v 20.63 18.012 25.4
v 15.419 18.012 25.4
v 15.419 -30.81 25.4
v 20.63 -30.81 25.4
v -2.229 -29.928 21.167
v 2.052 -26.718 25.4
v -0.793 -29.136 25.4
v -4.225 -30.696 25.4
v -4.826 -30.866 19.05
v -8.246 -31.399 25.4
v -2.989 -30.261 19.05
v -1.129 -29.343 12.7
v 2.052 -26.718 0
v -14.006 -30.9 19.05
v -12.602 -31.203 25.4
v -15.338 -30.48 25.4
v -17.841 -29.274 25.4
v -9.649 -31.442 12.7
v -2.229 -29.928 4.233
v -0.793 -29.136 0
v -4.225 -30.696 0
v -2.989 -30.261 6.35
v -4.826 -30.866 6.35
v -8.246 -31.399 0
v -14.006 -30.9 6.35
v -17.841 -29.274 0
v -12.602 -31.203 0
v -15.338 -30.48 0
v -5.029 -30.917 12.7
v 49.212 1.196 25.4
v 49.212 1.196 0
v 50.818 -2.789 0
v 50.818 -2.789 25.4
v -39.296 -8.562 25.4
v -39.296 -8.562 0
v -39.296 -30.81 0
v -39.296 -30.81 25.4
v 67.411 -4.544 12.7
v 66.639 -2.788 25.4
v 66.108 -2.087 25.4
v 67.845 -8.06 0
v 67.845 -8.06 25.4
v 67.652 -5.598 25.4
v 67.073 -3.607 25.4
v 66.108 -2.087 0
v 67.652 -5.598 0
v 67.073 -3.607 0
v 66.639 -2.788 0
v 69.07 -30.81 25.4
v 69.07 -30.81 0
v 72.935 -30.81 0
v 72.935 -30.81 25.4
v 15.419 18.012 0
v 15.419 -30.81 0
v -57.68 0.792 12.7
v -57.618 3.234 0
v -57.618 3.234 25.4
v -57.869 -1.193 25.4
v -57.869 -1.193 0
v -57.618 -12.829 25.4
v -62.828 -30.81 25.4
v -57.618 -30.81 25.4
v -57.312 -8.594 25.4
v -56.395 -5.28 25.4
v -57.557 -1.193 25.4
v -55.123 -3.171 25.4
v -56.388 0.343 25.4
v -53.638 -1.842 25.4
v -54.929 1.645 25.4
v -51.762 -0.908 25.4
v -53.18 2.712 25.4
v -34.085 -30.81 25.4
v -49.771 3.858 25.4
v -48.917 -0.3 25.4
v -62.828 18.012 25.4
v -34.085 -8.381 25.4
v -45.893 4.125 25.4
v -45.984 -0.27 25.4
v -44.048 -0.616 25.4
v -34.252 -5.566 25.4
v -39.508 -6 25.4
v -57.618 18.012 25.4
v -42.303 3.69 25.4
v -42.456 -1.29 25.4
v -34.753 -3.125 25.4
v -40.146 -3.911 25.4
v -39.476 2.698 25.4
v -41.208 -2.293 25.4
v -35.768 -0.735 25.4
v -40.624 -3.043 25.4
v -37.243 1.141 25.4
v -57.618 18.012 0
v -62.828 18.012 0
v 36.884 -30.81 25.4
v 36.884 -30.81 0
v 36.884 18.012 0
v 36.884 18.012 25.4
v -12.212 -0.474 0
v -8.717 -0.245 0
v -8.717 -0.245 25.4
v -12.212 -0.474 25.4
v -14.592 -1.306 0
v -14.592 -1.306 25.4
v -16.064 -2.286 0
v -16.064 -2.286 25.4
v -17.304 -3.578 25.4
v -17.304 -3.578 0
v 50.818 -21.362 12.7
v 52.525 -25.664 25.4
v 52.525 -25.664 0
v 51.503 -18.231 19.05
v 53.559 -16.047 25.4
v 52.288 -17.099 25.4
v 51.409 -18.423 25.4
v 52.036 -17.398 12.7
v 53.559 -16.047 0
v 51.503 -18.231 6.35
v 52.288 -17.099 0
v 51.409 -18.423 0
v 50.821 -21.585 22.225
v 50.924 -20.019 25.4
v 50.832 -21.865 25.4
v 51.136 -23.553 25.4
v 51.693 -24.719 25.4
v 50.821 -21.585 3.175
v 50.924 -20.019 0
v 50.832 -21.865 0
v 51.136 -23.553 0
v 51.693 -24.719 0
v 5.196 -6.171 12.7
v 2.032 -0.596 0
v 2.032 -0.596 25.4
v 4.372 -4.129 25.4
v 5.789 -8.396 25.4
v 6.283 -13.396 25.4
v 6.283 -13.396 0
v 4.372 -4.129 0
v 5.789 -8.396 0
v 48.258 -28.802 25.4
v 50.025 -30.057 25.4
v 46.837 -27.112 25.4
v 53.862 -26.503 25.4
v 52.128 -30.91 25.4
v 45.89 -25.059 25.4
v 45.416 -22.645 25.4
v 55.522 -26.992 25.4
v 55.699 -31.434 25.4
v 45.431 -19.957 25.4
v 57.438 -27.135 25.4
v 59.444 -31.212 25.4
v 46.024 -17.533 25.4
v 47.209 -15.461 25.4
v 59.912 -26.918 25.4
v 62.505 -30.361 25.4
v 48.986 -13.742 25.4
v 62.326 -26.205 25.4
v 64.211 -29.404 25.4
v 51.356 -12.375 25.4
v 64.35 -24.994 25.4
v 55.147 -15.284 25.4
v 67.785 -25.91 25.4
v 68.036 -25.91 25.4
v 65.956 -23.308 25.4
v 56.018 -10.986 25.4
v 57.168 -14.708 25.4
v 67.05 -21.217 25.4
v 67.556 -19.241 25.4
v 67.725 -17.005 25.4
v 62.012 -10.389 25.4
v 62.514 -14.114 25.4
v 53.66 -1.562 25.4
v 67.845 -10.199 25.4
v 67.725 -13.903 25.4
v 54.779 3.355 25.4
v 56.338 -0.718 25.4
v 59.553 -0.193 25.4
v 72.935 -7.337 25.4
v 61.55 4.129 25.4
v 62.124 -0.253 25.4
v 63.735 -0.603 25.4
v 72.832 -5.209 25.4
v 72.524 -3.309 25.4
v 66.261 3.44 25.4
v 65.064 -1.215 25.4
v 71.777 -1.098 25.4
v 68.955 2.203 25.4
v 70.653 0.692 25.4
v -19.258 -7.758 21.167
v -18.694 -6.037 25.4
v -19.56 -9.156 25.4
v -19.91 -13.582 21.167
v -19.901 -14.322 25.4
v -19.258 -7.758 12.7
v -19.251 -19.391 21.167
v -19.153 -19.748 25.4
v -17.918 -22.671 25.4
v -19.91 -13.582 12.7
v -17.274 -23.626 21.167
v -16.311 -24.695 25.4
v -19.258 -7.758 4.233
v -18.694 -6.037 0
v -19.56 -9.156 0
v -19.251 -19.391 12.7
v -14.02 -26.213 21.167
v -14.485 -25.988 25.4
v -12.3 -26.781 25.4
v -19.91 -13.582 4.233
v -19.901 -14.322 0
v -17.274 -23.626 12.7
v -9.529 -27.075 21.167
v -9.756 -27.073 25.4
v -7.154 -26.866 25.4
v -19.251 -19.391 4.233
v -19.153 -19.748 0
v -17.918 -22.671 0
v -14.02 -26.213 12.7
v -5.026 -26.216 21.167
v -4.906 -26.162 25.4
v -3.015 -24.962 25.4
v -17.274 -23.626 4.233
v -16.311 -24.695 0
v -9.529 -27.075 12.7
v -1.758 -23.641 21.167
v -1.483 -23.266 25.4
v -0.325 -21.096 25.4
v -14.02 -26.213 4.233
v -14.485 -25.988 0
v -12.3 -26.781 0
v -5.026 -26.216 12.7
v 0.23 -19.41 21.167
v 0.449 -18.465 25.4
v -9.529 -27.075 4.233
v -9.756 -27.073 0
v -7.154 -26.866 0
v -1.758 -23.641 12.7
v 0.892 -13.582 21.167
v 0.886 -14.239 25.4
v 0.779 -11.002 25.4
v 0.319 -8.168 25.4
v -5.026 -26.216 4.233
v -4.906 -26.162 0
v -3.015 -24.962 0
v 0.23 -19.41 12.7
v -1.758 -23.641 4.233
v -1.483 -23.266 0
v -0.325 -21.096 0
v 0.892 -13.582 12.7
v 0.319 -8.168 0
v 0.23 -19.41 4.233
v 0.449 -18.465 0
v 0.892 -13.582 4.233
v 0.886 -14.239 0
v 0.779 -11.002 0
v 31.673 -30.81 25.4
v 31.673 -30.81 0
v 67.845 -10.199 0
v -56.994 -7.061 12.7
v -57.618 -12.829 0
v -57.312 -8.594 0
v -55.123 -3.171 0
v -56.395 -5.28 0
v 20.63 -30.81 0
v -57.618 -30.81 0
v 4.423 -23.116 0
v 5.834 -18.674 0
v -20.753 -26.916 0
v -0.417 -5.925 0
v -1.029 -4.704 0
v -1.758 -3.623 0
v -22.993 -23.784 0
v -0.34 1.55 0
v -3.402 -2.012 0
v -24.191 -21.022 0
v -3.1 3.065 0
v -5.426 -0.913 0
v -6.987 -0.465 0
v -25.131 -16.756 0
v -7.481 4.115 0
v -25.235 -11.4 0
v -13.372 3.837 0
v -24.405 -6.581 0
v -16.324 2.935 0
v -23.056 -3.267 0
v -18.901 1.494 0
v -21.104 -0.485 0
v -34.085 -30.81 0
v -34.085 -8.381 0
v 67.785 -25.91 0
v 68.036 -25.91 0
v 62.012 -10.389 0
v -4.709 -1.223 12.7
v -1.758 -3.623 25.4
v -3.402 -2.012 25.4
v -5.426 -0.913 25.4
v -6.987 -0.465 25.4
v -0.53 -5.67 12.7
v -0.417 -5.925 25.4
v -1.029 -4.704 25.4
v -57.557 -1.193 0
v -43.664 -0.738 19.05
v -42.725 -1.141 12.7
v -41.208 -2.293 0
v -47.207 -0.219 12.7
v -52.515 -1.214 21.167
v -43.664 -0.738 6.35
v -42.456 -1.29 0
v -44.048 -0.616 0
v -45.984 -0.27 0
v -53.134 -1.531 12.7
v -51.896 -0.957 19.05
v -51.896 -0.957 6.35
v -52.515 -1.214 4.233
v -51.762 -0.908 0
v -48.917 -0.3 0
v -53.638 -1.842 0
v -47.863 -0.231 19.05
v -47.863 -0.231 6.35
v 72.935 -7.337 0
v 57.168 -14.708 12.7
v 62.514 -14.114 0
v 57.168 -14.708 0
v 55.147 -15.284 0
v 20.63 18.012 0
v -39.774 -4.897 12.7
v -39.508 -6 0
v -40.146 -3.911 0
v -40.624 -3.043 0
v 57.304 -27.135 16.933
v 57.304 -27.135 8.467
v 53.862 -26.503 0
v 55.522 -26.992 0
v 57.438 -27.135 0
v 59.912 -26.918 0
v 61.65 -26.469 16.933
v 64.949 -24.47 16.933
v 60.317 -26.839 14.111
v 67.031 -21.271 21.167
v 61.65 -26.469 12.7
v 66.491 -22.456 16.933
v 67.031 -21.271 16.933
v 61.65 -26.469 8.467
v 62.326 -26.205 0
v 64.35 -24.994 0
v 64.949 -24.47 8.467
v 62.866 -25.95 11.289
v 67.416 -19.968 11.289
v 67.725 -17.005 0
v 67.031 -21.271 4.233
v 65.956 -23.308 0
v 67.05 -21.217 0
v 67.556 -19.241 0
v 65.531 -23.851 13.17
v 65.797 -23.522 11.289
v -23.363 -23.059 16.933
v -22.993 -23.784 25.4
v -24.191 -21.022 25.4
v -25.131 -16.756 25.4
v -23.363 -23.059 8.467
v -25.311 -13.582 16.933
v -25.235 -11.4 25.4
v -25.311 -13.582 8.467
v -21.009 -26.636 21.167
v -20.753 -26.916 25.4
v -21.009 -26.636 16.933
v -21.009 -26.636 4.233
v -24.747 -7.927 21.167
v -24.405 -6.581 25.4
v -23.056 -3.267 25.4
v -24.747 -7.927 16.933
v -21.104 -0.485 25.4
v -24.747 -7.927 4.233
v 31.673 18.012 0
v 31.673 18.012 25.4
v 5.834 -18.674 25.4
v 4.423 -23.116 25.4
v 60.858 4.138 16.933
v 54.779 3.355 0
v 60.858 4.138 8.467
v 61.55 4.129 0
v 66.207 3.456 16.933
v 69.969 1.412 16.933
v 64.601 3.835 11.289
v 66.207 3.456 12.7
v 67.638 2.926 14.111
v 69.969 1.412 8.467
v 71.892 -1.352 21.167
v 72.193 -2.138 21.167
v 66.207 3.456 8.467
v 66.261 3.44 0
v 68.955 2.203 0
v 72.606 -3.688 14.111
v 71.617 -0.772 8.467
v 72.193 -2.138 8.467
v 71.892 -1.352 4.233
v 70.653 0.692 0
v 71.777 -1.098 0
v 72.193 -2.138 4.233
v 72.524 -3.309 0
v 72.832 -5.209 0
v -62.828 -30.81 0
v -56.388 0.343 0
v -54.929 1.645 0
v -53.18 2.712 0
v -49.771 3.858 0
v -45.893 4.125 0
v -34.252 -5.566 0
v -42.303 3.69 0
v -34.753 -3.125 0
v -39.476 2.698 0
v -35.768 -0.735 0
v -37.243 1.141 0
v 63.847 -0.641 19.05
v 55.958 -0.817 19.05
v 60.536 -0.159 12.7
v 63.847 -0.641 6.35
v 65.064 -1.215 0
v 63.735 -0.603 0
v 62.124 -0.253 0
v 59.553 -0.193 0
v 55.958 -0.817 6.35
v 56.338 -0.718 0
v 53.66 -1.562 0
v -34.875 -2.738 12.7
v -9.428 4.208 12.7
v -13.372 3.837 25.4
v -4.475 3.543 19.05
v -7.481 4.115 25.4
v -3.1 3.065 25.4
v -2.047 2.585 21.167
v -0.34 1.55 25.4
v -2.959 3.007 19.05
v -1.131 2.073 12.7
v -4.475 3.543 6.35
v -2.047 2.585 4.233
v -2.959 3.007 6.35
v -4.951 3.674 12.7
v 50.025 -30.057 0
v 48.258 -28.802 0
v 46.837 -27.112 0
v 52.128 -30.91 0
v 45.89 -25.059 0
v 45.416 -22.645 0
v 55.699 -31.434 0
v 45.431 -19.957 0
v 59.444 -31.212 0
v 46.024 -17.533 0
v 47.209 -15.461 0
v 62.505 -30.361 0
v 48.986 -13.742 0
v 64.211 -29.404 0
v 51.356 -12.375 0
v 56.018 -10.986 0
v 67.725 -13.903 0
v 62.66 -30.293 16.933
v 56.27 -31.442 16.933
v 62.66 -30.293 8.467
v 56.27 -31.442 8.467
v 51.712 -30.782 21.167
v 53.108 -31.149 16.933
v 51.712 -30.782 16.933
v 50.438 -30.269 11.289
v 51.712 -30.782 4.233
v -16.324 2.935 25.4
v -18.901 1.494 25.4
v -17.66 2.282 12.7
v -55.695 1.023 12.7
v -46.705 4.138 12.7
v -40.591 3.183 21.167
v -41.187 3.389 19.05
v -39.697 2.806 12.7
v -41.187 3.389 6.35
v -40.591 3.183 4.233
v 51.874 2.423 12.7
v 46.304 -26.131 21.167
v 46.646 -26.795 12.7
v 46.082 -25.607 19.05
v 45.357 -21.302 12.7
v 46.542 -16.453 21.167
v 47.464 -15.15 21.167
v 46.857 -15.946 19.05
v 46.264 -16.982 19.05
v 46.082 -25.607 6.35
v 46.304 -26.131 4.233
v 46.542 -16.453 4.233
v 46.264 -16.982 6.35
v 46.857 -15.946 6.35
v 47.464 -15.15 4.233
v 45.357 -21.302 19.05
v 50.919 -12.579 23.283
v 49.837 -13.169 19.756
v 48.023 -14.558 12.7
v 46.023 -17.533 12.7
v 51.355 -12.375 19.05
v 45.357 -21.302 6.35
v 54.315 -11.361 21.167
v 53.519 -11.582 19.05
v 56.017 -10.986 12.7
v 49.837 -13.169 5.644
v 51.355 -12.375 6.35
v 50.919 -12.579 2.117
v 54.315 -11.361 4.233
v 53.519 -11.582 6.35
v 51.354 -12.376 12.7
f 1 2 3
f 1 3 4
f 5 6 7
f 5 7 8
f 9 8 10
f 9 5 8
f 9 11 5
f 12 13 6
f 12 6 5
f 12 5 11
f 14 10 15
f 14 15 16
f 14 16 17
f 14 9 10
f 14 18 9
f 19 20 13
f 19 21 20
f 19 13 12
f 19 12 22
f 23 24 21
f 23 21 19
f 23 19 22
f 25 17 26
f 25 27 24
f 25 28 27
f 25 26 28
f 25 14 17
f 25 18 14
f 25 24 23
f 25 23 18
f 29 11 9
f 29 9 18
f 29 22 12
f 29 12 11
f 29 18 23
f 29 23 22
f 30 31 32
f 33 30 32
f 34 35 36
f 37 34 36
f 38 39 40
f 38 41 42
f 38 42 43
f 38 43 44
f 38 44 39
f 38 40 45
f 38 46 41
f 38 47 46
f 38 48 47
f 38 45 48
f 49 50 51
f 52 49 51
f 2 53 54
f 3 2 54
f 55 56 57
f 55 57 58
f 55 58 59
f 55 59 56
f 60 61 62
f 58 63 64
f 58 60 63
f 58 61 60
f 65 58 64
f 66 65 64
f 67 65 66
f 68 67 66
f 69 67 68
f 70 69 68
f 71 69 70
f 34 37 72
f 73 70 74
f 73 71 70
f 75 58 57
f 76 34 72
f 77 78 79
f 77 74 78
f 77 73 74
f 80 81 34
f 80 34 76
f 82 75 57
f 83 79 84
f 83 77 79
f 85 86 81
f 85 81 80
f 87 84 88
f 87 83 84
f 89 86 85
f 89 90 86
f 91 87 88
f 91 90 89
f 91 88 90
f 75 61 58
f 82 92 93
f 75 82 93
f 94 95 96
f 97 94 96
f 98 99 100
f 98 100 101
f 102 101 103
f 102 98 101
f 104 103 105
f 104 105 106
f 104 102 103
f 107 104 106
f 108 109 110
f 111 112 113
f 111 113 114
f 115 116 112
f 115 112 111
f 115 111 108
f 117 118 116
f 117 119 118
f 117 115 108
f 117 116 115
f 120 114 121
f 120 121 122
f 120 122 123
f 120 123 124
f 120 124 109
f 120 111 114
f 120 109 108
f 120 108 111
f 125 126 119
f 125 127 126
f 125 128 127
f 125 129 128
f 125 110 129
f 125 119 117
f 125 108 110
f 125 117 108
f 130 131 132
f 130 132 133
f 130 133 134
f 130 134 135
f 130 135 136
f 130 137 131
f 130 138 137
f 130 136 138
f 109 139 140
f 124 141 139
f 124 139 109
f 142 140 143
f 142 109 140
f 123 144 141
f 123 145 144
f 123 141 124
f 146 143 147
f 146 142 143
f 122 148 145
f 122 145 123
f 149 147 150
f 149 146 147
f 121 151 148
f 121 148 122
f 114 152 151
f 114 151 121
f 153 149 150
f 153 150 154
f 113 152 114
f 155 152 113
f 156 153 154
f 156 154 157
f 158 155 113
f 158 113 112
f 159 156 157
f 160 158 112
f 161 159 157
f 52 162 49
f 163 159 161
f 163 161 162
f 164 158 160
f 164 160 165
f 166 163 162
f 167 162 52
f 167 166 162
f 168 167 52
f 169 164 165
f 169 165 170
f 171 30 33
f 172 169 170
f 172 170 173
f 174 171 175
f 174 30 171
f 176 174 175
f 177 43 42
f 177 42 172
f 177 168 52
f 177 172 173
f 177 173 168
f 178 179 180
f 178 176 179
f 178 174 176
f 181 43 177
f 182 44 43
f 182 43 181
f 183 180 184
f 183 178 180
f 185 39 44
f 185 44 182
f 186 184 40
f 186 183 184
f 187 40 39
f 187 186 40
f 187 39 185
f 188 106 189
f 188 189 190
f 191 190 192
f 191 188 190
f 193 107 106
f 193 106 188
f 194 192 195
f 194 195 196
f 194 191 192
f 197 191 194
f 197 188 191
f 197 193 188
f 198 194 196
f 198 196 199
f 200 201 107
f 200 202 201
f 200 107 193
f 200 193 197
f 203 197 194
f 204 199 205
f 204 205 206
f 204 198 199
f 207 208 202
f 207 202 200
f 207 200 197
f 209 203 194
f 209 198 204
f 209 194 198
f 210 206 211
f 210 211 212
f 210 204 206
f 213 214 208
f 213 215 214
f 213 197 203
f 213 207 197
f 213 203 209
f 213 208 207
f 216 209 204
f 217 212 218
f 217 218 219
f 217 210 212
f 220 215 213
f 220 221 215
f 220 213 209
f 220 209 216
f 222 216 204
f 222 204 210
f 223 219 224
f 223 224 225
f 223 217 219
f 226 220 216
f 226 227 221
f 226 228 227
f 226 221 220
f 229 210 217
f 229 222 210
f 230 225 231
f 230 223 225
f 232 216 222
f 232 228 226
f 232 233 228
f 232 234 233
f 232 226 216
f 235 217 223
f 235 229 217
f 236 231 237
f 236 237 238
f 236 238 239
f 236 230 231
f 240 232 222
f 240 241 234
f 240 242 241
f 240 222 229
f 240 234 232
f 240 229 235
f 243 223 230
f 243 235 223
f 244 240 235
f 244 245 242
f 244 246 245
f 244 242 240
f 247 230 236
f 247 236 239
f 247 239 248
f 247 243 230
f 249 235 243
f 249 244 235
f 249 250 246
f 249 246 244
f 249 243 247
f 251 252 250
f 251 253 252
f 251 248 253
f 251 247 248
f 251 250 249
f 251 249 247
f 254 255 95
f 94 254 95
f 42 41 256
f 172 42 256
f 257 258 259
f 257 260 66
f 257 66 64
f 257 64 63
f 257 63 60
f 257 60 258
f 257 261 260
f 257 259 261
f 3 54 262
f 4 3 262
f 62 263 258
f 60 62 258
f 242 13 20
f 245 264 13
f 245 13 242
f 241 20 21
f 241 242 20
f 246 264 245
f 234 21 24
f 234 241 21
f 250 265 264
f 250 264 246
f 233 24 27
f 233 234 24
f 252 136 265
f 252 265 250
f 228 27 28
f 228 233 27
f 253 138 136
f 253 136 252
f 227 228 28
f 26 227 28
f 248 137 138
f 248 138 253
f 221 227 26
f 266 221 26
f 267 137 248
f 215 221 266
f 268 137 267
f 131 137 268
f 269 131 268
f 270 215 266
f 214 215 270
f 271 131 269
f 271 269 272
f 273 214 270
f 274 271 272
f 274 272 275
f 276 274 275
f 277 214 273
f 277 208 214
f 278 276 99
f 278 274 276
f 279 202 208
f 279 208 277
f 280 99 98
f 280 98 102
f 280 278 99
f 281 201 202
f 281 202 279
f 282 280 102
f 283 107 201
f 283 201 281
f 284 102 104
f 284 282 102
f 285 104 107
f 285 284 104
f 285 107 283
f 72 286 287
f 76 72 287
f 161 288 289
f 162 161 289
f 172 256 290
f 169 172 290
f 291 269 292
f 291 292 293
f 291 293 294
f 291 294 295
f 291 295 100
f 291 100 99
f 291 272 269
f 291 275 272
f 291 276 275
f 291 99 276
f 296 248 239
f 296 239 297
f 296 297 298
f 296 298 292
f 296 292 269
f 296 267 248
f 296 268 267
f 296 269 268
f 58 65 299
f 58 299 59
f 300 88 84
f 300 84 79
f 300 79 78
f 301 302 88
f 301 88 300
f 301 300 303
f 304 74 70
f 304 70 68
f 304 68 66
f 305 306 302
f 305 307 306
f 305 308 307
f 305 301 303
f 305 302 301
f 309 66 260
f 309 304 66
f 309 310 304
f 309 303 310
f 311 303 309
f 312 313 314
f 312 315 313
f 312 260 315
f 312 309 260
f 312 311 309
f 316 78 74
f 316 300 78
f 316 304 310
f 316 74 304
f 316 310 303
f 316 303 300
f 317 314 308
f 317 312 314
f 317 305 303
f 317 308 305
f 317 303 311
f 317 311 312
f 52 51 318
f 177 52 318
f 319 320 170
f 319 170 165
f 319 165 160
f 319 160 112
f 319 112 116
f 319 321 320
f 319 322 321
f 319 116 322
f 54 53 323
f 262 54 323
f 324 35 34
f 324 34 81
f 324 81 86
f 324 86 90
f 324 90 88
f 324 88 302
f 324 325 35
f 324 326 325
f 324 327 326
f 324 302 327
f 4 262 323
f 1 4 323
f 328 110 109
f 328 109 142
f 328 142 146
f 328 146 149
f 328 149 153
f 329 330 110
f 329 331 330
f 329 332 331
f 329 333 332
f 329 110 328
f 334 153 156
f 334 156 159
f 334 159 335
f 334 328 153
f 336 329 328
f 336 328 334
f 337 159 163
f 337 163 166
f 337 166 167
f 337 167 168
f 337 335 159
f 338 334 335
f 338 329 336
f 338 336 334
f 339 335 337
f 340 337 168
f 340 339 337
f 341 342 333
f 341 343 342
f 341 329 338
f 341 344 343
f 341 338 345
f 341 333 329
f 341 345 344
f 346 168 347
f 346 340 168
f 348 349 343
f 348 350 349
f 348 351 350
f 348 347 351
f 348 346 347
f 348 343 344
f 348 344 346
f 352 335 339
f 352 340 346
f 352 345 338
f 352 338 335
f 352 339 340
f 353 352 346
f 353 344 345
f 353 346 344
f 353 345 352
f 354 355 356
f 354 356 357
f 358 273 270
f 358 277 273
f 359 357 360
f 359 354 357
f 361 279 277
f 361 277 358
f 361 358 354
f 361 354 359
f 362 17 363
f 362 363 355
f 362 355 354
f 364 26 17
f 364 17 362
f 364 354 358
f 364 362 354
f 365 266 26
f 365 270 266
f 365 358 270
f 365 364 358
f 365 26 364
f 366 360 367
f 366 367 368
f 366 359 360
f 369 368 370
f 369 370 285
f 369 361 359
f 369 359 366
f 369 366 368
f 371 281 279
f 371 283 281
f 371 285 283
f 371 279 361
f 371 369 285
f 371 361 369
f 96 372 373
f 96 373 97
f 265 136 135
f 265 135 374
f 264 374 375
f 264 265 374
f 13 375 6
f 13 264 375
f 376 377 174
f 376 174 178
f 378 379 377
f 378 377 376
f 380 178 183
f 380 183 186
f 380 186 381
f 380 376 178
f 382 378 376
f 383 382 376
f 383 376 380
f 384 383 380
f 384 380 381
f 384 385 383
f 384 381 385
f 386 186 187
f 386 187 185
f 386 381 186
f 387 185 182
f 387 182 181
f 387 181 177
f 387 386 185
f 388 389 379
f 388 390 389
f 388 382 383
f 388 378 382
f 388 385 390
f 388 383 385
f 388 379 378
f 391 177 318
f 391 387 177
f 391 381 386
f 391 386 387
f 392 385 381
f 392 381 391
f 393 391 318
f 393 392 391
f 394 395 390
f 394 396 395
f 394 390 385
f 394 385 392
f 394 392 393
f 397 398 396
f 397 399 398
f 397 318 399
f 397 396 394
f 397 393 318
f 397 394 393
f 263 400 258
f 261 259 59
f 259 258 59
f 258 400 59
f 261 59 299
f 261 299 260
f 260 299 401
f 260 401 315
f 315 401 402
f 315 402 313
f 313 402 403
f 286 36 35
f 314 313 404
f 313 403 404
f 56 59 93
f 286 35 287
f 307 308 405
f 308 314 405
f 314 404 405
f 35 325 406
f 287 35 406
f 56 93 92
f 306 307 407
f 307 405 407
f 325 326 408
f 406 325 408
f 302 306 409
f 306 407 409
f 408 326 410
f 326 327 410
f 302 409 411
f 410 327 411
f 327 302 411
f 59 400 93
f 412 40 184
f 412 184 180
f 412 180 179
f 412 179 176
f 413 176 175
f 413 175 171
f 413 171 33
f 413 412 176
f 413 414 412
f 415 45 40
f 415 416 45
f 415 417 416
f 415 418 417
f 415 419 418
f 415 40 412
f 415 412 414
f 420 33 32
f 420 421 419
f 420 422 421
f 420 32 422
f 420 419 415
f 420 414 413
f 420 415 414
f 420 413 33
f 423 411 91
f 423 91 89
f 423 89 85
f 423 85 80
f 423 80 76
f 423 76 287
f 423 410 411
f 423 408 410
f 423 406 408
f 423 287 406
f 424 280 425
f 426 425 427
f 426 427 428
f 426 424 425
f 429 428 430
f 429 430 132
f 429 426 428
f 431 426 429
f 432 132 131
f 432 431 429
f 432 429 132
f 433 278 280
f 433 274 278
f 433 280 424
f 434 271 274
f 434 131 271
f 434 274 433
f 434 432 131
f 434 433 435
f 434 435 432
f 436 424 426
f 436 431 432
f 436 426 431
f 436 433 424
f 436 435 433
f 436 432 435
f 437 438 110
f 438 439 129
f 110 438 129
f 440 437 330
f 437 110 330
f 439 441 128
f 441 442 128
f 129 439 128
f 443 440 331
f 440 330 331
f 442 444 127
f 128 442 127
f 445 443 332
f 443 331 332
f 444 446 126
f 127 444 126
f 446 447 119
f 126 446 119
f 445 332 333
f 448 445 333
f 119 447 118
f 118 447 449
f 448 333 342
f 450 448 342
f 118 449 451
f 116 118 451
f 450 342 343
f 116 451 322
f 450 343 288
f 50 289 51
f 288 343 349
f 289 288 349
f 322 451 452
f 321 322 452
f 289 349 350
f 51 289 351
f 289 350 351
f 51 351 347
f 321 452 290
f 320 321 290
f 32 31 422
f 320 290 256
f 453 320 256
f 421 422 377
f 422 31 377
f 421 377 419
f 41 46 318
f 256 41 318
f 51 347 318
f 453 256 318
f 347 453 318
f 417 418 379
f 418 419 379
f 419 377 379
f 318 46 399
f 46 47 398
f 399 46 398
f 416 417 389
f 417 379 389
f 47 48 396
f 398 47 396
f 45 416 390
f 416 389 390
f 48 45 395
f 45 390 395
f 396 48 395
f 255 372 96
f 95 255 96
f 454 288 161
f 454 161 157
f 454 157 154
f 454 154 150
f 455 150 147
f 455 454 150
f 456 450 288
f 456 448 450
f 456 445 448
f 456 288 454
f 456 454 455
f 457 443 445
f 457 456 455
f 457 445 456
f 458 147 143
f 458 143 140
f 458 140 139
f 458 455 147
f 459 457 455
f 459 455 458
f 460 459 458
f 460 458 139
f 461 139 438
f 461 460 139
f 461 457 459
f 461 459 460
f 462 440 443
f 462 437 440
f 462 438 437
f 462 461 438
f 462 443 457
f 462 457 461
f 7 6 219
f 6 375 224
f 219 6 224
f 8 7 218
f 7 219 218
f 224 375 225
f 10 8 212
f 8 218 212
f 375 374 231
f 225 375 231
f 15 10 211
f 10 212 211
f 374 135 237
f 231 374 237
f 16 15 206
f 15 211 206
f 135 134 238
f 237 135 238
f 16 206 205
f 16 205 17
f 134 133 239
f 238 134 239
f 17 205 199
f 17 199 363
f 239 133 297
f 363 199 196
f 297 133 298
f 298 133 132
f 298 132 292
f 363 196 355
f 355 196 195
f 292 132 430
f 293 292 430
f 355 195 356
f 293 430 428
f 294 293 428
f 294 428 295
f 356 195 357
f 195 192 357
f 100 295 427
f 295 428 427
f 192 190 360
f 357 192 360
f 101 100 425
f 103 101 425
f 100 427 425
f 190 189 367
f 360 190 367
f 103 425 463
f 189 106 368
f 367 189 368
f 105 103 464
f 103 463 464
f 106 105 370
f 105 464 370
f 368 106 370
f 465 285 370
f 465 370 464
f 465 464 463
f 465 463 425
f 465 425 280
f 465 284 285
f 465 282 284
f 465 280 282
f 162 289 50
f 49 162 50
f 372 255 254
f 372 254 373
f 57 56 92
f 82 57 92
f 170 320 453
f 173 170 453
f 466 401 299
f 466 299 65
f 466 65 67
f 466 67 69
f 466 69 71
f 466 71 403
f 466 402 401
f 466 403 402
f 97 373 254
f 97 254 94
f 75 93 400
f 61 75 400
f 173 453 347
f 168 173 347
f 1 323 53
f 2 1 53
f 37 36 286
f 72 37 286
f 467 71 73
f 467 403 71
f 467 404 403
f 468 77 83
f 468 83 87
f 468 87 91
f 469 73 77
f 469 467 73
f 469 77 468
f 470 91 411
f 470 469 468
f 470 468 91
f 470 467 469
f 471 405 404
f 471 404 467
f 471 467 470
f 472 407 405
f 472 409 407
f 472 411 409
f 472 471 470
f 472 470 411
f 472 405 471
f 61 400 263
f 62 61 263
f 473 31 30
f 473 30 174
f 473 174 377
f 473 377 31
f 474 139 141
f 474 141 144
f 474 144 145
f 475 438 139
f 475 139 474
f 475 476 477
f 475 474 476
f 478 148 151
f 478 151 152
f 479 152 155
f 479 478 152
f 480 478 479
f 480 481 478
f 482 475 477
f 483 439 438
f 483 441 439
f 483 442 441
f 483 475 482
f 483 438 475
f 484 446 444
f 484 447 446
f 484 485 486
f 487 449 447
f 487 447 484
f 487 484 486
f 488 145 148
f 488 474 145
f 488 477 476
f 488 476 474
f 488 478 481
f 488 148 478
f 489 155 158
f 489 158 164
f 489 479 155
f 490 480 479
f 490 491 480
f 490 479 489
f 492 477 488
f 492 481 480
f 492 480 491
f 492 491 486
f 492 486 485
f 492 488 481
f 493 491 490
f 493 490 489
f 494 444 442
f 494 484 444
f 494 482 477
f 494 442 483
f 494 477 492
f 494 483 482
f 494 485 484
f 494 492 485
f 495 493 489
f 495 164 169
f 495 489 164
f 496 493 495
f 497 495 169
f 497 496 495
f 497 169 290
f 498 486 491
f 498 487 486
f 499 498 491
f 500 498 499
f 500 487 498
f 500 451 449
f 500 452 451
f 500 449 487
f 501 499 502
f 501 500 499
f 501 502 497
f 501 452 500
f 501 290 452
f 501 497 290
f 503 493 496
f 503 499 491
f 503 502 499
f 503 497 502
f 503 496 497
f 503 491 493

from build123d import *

# Parameters (mm, degrees)
F0_W     = 5.2104656285
F0_H     = 48.8217617561
F1_DEPTH = 25.4


with BuildPart() as f1:
    # F0 (on Top) → F1 (new body)
    with BuildSketch(Plane.XY):
        with BuildLine():
            add(Edge.make_bspline(
                [(-13.3722078844, 3.8366541831), (-11.5293562231, 4.2080032031), (-9.428347489, 4.2080032031)],
                knots=[0.7187155366, 0.7187155366, 0.7187155366, 1, 1, 1], degree=2))
            Line((-13.3722078844, 3.8366541831), (-8.7174049676, -0.2445146523))
            add(Edge.make_bspline(
                [(-1.758220822, -3.6227543888), (-4.180892032, -0.5118243123), (-8.7174049676, -0.2445146523)],
                knots=[0, 0, 0, 0.9140740378, 0.9140740378, 0.9140740378], degree=2))
            add(Edge.make_bspline(
                [(0.3193388525, -8.1676164271), (-0.3399992938, -5.4438797604), (-1.758220822, -3.6227543888)],
                knots=[0.464904906, 0.464904906, 0.464904906, 1, 1, 1], degree=2))
            Line((0.3193388525, -8.1676164271), (6.2828148414, -13.3961841648))
            add(Edge.make_bspline(
                [(2.0316650638, -0.5958653966), (6.2350067194, -5.3450955788), (6.2828148414, -13.3961841648)],
                knots=[0, 0, 0, 0.9886261632, 0.9886261632, 0.9886261632], degree=2))
            add(Edge.make_bspline(
                [(-9.428347489, 4.2080032031), (-2.2200347313, 4.2080032031), (2.0316650638, -0.5958653966)],
                knots=[0, 0, 0, 1, 1, 1], degree=2))
        make_face()
        with BuildLine():
            Line((-8.7174049676, -0.2445146523), (-13.3722078844, 3.8366541831))
            add(Edge.make_bspline(
                [(-21.1042078473, -0.4854316357), (-18.080914881, 2.8878129032), (-13.3722078844, 3.8366541831)],
                knots=[0, 0, 0, 0.7187155366, 0.7187155366, 0.7187155366], degree=2))
            add(Edge.make_bspline(
                [(-25.3107301948, -13.5818717366), (-25.3107301948, -5.1788664744), (-21.1042078473, -0.4854316357)],
                knots=[0, 0, 0, 1, 1, 1], degree=2))
            add(Edge.make_bspline(
                [(-23.3630802296, -23.0590963094), (-25.3107301948, -19.0132048869), (-25.3107301948, -13.5818717366)],
                knots=[0, 0, 0, 1, 1, 1], degree=2))
            add(Edge.make_bspline(
                [(-17.841392184, -29.273505219), (-21.4154302644, -27.1049877319), (-23.3630802296, -23.0590963094)],
                knots=[0, 0, 0, 1, 1, 1], degree=2))
            add(Edge.make_bspline(
                [(-9.6492150108, -31.442022706), (-14.2673541035, -31.442022706), (-17.841392184, -29.273505219)],
                knots=[0, 0, 0, 1, 1, 1], degree=2))
            add(Edge.make_bspline(
                [(2.0517439295, -26.7184695688), (-2.179877, -31.442022706), (-9.6492150108, -31.442022706)],
                knots=[0, 0, 0, 1, 1, 1], degree=2))
            add(Edge.make_bspline(
                [(6.283364859, -13.5818717366), (6.283364859, -21.9949164315), (2.0517439295, -26.7184695688)],
                knots=[0, 0, 0, 1, 1, 1], degree=2))
            add(Edge.make_bspline(
                [(6.2828148414, -13.3961841648), (6.283364859, -13.4888094372), (6.283364859, -13.5818717366)],
                knots=[0.9886261632, 0.9886261632, 0.9886261632, 1, 1, 1], degree=2))
            Line((6.2828148414, -13.3961841648), (0.3193388525, -8.1676164271))
            add(Edge.make_bspline(
                [(0.8921894399, -13.5818717366), (0.8921894399, -10.5340715734), (0.3193388525, -8.1676164271)],
                knots=[0, 0, 0, 0.464904906, 0.464904906, 0.464904906], degree=2))
            add(Edge.make_bspline(
                [(-1.758220822, -23.6413834124), (0.8921894399, -20.2078973913), (0.8921894399, -13.5818717366)],
                knots=[0, 0, 0, 1, 1, 1], degree=2))
            add(Edge.make_bspline(
                [(-9.5287418171, -27.0748694335), (-4.4086310839, -27.0748694335), (-1.758220822, -23.6413834124)],
                knots=[0, 0, 0, 1, 1, 1], degree=2))
            add(Edge.make_bspline(
                [(-17.2741642302, -23.6263242632), (-14.6388131175, -27.0748694335), (-9.5287418171, -27.0748694335)],
                knots=[0, 0, 0, 1, 1, 1], degree=2))
            add(Edge.make_bspline(
                [(-19.9095153429, -13.5818717366), (-19.9095153429, -20.1777790929), (-17.2741642302, -23.6263242632)],
                knots=[0, 0, 0, 1, 1, 1], degree=2))
            add(Edge.make_bspline(
                [(-17.3042825286, -3.5775769412), (-19.9095153429, -6.9357672162), (-19.9095153429, -13.5818717366)],
                knots=[0, 0, 0, 1, 1, 1], degree=2))
            add(Edge.make_bspline(
                [(-9.588978414, -0.2193866662), (-14.6990497144, -0.2193866662), (-17.3042825286, -3.5775769412)],
                knots=[0, 0, 0, 1, 1, 1], degree=2))
            add(Edge.make_bspline(
                [(-8.7174049676, -0.2445146523), (-9.1438520853, -0.2193866662), (-9.588978414, -0.2193866662)],
                knots=[0.9140740378, 0.9140740378, 0.9140740378, 1, 1, 1], degree=2))
        make_face()
        Polygon((15.4192487163, 18.0122233172), (15.4192487163, -21.4066907024), (20.6297143448, -25.9750452216), (20.6297143448, 18.0122233172), align=None)
        Polygon((20.6297143448, -25.9750452216), (15.4192487163, -21.4066907024), (15.4192487163, -30.8095384389), (20.6297143448, -30.8095384389), align=None)
        with BuildLine():
            Line((-39.2956600994, -8.5621553315), (-39.2956600994, -30.8095384389))
            Line((-39.2956600994, -30.8095384389), (-34.0851944709, -30.8095384389))
            Line((-34.0851944709, -30.8095384389), (-34.0851944709, -8.3814455409))
            add(Edge.make_bspline(
                [(-37.2425960897, 1.1409564796), (-34.0851944709, -1.8558142142), (-34.0851944709, -8.3814455409)],
                knots=[0, 0, 0, 1, 1, 1], degree=2))
            add(Edge.make_bspline(
                [(-46.7047615134, 4.1377271735), (-40.3999977085, 4.1377271735), (-37.2425960897, 1.1409564796)],
                knots=[0, 0, 0, 1, 1, 1], degree=2))
            add(Edge.make_bspline(
                [(-53.180195676, 2.7121277144), (-50.3390361907, 4.1377271735), (-46.7047615134, 4.1377271735)],
                knots=[0, 0, 0, 1, 1, 1], degree=2))
            add(Edge.make_bspline(
                [(-57.5573883812, -1.1932116488), (-56.0213551612, 1.2865282554), (-53.180195676, 2.7121277144)],
                knots=[0, 0, 0, 1, 1, 1], degree=2))
            Line((-57.5573883812, -1.1932116488), (-57.8686107983, -1.1932116488))
            add(Edge.make_bspline(
                [(-57.6176249781, 3.2341782205), (-57.6176249781, 0.563689093), (-57.8686107983, -1.1932116488)],
                knots=[0, 0, 0, 1, 1, 1], degree=2))
            Line((-57.6176249781, 3.2341782205), (-57.6176249781, 18.0122233172))
            Line((-57.6176249781, 18.0122233172), (-62.8280906066, 18.0122233172))
            Line((-62.8280906066, 18.0122233172), (-62.8280906066, -30.8095384389))
            Line((-62.8280906066, -30.8095384389), (-57.6176249781, -30.8095384389))
            Line((-57.6176249781, -30.8095384389), (-57.6176249781, -12.8289142758))
            add(Edge.make_bspline(
                [(-55.1228259247, -3.1709799124), (-57.6176249781, -6.1225731586), (-57.6176249781, -12.8289142758)],
                knots=[0, 0, 0, 1, 1, 1], degree=2))
            add(Edge.make_bspline(
                [(-47.2067331539, -0.2193866662), (-52.6280268714, -0.2193866662), (-55.1228259247, -3.1709799124)],
                knots=[0, 0, 0, 1, 1, 1], degree=2))
            add(Edge.make_bspline(
                [(-41.2081720498, -2.2925295415), (-43.1206840001, -0.2193866662), (-47.2067331539, -0.2193866662)],
                knots=[0, 0, 0, 1, 1, 1], degree=2))
            add(Edge.make_bspline(
                [(-39.2956600994, -8.5621553315), (-39.2956600994, -4.3656724168), (-41.2081720498, -2.2925295415)],
                knots=[0, 0, 0, 1, 1, 1], degree=2))
        make_face()
        with Locations((34.2783232503, -6.3986575609)):
            Rectangle(F0_W, F0_H)
        with BuildLine():
            Line((68.0359160746, -25.9102952275), (69.0699776541, -30.8095384389))
            Line((69.0699776541, -30.8095384389), (72.935159286, -30.8095384389))
            Line((72.935159286, -30.8095384389), (72.935159286, -7.3373445286))
            add(Edge.make_bspline(
                [(69.9685068906, 1.4120211655), (72.935159286, -1.3136848425), (72.935159286, -7.3373445286)],
                knots=[0, 0, 0, 1, 1, 1], degree=2))
            add(Edge.make_bspline(
                [(60.8577216153, 4.1377271735), (67.0018544952, 4.1377271735), (69.9685068906, 1.4120211655)],
                knots=[0, 0, 0, 1, 1, 1], degree=2))
            add(Edge.make_bspline(
                [(54.7788450487, 3.3546514143), (57.805734041, 4.1377271735), (60.8577216153, 4.1377271735)],
                knots=[0, 0, 0, 1, 1, 1], degree=2))
            add(Edge.make_bspline(
                [(49.2119795555, 1.1961733601), (51.7519560565, 2.5715756551), (54.7788450487, 3.3546514143)],
                knots=[0, 0, 0, 1, 1, 1], degree=2))
            Line((49.2119795555, 1.1961733601), (50.8182888051, -2.7894814656))
            add(Edge.make_bspline(
                [(60.5364597654, -0.1591500693), (56.2395825226, -0.1591500693), (50.8182888051, -2.7894814656)],
                knots=[0, 0, 0, 1, 1, 1], degree=2))
            add(Edge.make_bspline(
                [(66.1083449751, -2.0867211689), (64.3715230989, -0.1591500693), (60.5364597654, -0.1591500693)],
                knots=[0, 0, 0, 1, 1, 1], degree=2))
            add(Edge.make_bspline(
                [(67.8451668512, -8.060183691), (67.8451668512, -4.0142922684), (66.1083449751, -2.0867211689)],
                knots=[0, 0, 0, 1, 1, 1], degree=2))
            Line((67.8451668512, -8.060183691), (67.8451668512, -10.1985828795))
            Line((67.8451668512, -10.1985828795), (62.0122563885, -10.3893321029))
            add(Edge.make_bspline(
                [(45.3568373563, -21.3021955676), (45.3568373563, -10.8913037434), (62.0122563885, -10.3893321029)],
                knots=[0, 0, 0, 1, 1, 1], degree=2))
            add(Edge.make_bspline(
                [(48.2582334385, -28.8016518769), (45.3568373563, -26.1612810478), (45.3568373563, -21.3021955676)],
                knots=[0, 0, 0, 1, 1, 1], degree=2))
            add(Edge.make_bspline(
                [(56.2697008211, -31.442022706), (51.1596295206, -31.442022706), (48.2582334385, -28.8016518769)],
                knots=[0, 0, 0, 1, 1, 1], degree=2))
            add(Edge.make_bspline(
                [(62.6597998048, -30.2925076492), (60.1047641546, -31.442022706), (56.2697008211, -31.442022706)],
                knots=[0, 0, 0, 1, 1, 1], degree=2))
            add(Edge.make_bspline(
                [(67.7849302544, -25.9102952275), (65.214835455, -29.1429925924), (62.6597998048, -30.2925076492)],
                knots=[0, 0, 0, 1, 1, 1], degree=2))
            Line((67.7849302544, -25.9102952275), (68.0359160746, -25.9102952275))
        make_face()
        with BuildLine():
            add(Edge.make_bspline(
                [(57.3037624005, -27.1351060304), (62.1728873135, -27.1351060304), (64.9487904855, -24.4696366193)],
                knots=[0, 0, 0, 1, 1, 1], degree=2))
            add(Edge.make_bspline(
                [(52.5249923828, -25.6643291237), (54.2316959606, -27.1351060304), (57.3037624005, -27.1351060304)],
                knots=[0, 0, 0, 1, 1, 1], degree=2))
            add(Edge.make_bspline(
                [(50.8182888051, -21.3624321645), (50.8182888051, -24.193552217), (52.5249923828, -25.6643291237)],
                knots=[0, 0, 0, 1, 1, 1], degree=2))
            add(Edge.make_bspline(
                [(53.5590539623, -16.0465524915), (50.8182888051, -17.7582757856), (50.8182888051, -21.3624321645)],
                knots=[0, 0, 0, 1, 1, 1], degree=2))
            add(Edge.make_bspline(
                [(62.514228029, -14.1139616755), (56.2998191195, -14.3348291973), (53.5590539623, -16.0465524915)],
                knots=[0, 0, 0, 1, 1, 1], degree=2))
            Line((62.514228029, -14.1139616755), (67.7246936575, -13.9031335865))
            Line((67.7246936575, -13.9031335865), (67.7246936575, -17.0053183249))
            add(Edge.make_bspline(
                [(64.9487904855, -24.4696366193), (67.7246936575, -21.8041672082), (67.7246936575, -17.0053183249)],
                knots=[0, 0, 0, 1, 1, 1], degree=2))
        make_face(mode=Mode.SUBTRACT)
    extrude(amount=F1_DEPTH)


solid = f1.part
